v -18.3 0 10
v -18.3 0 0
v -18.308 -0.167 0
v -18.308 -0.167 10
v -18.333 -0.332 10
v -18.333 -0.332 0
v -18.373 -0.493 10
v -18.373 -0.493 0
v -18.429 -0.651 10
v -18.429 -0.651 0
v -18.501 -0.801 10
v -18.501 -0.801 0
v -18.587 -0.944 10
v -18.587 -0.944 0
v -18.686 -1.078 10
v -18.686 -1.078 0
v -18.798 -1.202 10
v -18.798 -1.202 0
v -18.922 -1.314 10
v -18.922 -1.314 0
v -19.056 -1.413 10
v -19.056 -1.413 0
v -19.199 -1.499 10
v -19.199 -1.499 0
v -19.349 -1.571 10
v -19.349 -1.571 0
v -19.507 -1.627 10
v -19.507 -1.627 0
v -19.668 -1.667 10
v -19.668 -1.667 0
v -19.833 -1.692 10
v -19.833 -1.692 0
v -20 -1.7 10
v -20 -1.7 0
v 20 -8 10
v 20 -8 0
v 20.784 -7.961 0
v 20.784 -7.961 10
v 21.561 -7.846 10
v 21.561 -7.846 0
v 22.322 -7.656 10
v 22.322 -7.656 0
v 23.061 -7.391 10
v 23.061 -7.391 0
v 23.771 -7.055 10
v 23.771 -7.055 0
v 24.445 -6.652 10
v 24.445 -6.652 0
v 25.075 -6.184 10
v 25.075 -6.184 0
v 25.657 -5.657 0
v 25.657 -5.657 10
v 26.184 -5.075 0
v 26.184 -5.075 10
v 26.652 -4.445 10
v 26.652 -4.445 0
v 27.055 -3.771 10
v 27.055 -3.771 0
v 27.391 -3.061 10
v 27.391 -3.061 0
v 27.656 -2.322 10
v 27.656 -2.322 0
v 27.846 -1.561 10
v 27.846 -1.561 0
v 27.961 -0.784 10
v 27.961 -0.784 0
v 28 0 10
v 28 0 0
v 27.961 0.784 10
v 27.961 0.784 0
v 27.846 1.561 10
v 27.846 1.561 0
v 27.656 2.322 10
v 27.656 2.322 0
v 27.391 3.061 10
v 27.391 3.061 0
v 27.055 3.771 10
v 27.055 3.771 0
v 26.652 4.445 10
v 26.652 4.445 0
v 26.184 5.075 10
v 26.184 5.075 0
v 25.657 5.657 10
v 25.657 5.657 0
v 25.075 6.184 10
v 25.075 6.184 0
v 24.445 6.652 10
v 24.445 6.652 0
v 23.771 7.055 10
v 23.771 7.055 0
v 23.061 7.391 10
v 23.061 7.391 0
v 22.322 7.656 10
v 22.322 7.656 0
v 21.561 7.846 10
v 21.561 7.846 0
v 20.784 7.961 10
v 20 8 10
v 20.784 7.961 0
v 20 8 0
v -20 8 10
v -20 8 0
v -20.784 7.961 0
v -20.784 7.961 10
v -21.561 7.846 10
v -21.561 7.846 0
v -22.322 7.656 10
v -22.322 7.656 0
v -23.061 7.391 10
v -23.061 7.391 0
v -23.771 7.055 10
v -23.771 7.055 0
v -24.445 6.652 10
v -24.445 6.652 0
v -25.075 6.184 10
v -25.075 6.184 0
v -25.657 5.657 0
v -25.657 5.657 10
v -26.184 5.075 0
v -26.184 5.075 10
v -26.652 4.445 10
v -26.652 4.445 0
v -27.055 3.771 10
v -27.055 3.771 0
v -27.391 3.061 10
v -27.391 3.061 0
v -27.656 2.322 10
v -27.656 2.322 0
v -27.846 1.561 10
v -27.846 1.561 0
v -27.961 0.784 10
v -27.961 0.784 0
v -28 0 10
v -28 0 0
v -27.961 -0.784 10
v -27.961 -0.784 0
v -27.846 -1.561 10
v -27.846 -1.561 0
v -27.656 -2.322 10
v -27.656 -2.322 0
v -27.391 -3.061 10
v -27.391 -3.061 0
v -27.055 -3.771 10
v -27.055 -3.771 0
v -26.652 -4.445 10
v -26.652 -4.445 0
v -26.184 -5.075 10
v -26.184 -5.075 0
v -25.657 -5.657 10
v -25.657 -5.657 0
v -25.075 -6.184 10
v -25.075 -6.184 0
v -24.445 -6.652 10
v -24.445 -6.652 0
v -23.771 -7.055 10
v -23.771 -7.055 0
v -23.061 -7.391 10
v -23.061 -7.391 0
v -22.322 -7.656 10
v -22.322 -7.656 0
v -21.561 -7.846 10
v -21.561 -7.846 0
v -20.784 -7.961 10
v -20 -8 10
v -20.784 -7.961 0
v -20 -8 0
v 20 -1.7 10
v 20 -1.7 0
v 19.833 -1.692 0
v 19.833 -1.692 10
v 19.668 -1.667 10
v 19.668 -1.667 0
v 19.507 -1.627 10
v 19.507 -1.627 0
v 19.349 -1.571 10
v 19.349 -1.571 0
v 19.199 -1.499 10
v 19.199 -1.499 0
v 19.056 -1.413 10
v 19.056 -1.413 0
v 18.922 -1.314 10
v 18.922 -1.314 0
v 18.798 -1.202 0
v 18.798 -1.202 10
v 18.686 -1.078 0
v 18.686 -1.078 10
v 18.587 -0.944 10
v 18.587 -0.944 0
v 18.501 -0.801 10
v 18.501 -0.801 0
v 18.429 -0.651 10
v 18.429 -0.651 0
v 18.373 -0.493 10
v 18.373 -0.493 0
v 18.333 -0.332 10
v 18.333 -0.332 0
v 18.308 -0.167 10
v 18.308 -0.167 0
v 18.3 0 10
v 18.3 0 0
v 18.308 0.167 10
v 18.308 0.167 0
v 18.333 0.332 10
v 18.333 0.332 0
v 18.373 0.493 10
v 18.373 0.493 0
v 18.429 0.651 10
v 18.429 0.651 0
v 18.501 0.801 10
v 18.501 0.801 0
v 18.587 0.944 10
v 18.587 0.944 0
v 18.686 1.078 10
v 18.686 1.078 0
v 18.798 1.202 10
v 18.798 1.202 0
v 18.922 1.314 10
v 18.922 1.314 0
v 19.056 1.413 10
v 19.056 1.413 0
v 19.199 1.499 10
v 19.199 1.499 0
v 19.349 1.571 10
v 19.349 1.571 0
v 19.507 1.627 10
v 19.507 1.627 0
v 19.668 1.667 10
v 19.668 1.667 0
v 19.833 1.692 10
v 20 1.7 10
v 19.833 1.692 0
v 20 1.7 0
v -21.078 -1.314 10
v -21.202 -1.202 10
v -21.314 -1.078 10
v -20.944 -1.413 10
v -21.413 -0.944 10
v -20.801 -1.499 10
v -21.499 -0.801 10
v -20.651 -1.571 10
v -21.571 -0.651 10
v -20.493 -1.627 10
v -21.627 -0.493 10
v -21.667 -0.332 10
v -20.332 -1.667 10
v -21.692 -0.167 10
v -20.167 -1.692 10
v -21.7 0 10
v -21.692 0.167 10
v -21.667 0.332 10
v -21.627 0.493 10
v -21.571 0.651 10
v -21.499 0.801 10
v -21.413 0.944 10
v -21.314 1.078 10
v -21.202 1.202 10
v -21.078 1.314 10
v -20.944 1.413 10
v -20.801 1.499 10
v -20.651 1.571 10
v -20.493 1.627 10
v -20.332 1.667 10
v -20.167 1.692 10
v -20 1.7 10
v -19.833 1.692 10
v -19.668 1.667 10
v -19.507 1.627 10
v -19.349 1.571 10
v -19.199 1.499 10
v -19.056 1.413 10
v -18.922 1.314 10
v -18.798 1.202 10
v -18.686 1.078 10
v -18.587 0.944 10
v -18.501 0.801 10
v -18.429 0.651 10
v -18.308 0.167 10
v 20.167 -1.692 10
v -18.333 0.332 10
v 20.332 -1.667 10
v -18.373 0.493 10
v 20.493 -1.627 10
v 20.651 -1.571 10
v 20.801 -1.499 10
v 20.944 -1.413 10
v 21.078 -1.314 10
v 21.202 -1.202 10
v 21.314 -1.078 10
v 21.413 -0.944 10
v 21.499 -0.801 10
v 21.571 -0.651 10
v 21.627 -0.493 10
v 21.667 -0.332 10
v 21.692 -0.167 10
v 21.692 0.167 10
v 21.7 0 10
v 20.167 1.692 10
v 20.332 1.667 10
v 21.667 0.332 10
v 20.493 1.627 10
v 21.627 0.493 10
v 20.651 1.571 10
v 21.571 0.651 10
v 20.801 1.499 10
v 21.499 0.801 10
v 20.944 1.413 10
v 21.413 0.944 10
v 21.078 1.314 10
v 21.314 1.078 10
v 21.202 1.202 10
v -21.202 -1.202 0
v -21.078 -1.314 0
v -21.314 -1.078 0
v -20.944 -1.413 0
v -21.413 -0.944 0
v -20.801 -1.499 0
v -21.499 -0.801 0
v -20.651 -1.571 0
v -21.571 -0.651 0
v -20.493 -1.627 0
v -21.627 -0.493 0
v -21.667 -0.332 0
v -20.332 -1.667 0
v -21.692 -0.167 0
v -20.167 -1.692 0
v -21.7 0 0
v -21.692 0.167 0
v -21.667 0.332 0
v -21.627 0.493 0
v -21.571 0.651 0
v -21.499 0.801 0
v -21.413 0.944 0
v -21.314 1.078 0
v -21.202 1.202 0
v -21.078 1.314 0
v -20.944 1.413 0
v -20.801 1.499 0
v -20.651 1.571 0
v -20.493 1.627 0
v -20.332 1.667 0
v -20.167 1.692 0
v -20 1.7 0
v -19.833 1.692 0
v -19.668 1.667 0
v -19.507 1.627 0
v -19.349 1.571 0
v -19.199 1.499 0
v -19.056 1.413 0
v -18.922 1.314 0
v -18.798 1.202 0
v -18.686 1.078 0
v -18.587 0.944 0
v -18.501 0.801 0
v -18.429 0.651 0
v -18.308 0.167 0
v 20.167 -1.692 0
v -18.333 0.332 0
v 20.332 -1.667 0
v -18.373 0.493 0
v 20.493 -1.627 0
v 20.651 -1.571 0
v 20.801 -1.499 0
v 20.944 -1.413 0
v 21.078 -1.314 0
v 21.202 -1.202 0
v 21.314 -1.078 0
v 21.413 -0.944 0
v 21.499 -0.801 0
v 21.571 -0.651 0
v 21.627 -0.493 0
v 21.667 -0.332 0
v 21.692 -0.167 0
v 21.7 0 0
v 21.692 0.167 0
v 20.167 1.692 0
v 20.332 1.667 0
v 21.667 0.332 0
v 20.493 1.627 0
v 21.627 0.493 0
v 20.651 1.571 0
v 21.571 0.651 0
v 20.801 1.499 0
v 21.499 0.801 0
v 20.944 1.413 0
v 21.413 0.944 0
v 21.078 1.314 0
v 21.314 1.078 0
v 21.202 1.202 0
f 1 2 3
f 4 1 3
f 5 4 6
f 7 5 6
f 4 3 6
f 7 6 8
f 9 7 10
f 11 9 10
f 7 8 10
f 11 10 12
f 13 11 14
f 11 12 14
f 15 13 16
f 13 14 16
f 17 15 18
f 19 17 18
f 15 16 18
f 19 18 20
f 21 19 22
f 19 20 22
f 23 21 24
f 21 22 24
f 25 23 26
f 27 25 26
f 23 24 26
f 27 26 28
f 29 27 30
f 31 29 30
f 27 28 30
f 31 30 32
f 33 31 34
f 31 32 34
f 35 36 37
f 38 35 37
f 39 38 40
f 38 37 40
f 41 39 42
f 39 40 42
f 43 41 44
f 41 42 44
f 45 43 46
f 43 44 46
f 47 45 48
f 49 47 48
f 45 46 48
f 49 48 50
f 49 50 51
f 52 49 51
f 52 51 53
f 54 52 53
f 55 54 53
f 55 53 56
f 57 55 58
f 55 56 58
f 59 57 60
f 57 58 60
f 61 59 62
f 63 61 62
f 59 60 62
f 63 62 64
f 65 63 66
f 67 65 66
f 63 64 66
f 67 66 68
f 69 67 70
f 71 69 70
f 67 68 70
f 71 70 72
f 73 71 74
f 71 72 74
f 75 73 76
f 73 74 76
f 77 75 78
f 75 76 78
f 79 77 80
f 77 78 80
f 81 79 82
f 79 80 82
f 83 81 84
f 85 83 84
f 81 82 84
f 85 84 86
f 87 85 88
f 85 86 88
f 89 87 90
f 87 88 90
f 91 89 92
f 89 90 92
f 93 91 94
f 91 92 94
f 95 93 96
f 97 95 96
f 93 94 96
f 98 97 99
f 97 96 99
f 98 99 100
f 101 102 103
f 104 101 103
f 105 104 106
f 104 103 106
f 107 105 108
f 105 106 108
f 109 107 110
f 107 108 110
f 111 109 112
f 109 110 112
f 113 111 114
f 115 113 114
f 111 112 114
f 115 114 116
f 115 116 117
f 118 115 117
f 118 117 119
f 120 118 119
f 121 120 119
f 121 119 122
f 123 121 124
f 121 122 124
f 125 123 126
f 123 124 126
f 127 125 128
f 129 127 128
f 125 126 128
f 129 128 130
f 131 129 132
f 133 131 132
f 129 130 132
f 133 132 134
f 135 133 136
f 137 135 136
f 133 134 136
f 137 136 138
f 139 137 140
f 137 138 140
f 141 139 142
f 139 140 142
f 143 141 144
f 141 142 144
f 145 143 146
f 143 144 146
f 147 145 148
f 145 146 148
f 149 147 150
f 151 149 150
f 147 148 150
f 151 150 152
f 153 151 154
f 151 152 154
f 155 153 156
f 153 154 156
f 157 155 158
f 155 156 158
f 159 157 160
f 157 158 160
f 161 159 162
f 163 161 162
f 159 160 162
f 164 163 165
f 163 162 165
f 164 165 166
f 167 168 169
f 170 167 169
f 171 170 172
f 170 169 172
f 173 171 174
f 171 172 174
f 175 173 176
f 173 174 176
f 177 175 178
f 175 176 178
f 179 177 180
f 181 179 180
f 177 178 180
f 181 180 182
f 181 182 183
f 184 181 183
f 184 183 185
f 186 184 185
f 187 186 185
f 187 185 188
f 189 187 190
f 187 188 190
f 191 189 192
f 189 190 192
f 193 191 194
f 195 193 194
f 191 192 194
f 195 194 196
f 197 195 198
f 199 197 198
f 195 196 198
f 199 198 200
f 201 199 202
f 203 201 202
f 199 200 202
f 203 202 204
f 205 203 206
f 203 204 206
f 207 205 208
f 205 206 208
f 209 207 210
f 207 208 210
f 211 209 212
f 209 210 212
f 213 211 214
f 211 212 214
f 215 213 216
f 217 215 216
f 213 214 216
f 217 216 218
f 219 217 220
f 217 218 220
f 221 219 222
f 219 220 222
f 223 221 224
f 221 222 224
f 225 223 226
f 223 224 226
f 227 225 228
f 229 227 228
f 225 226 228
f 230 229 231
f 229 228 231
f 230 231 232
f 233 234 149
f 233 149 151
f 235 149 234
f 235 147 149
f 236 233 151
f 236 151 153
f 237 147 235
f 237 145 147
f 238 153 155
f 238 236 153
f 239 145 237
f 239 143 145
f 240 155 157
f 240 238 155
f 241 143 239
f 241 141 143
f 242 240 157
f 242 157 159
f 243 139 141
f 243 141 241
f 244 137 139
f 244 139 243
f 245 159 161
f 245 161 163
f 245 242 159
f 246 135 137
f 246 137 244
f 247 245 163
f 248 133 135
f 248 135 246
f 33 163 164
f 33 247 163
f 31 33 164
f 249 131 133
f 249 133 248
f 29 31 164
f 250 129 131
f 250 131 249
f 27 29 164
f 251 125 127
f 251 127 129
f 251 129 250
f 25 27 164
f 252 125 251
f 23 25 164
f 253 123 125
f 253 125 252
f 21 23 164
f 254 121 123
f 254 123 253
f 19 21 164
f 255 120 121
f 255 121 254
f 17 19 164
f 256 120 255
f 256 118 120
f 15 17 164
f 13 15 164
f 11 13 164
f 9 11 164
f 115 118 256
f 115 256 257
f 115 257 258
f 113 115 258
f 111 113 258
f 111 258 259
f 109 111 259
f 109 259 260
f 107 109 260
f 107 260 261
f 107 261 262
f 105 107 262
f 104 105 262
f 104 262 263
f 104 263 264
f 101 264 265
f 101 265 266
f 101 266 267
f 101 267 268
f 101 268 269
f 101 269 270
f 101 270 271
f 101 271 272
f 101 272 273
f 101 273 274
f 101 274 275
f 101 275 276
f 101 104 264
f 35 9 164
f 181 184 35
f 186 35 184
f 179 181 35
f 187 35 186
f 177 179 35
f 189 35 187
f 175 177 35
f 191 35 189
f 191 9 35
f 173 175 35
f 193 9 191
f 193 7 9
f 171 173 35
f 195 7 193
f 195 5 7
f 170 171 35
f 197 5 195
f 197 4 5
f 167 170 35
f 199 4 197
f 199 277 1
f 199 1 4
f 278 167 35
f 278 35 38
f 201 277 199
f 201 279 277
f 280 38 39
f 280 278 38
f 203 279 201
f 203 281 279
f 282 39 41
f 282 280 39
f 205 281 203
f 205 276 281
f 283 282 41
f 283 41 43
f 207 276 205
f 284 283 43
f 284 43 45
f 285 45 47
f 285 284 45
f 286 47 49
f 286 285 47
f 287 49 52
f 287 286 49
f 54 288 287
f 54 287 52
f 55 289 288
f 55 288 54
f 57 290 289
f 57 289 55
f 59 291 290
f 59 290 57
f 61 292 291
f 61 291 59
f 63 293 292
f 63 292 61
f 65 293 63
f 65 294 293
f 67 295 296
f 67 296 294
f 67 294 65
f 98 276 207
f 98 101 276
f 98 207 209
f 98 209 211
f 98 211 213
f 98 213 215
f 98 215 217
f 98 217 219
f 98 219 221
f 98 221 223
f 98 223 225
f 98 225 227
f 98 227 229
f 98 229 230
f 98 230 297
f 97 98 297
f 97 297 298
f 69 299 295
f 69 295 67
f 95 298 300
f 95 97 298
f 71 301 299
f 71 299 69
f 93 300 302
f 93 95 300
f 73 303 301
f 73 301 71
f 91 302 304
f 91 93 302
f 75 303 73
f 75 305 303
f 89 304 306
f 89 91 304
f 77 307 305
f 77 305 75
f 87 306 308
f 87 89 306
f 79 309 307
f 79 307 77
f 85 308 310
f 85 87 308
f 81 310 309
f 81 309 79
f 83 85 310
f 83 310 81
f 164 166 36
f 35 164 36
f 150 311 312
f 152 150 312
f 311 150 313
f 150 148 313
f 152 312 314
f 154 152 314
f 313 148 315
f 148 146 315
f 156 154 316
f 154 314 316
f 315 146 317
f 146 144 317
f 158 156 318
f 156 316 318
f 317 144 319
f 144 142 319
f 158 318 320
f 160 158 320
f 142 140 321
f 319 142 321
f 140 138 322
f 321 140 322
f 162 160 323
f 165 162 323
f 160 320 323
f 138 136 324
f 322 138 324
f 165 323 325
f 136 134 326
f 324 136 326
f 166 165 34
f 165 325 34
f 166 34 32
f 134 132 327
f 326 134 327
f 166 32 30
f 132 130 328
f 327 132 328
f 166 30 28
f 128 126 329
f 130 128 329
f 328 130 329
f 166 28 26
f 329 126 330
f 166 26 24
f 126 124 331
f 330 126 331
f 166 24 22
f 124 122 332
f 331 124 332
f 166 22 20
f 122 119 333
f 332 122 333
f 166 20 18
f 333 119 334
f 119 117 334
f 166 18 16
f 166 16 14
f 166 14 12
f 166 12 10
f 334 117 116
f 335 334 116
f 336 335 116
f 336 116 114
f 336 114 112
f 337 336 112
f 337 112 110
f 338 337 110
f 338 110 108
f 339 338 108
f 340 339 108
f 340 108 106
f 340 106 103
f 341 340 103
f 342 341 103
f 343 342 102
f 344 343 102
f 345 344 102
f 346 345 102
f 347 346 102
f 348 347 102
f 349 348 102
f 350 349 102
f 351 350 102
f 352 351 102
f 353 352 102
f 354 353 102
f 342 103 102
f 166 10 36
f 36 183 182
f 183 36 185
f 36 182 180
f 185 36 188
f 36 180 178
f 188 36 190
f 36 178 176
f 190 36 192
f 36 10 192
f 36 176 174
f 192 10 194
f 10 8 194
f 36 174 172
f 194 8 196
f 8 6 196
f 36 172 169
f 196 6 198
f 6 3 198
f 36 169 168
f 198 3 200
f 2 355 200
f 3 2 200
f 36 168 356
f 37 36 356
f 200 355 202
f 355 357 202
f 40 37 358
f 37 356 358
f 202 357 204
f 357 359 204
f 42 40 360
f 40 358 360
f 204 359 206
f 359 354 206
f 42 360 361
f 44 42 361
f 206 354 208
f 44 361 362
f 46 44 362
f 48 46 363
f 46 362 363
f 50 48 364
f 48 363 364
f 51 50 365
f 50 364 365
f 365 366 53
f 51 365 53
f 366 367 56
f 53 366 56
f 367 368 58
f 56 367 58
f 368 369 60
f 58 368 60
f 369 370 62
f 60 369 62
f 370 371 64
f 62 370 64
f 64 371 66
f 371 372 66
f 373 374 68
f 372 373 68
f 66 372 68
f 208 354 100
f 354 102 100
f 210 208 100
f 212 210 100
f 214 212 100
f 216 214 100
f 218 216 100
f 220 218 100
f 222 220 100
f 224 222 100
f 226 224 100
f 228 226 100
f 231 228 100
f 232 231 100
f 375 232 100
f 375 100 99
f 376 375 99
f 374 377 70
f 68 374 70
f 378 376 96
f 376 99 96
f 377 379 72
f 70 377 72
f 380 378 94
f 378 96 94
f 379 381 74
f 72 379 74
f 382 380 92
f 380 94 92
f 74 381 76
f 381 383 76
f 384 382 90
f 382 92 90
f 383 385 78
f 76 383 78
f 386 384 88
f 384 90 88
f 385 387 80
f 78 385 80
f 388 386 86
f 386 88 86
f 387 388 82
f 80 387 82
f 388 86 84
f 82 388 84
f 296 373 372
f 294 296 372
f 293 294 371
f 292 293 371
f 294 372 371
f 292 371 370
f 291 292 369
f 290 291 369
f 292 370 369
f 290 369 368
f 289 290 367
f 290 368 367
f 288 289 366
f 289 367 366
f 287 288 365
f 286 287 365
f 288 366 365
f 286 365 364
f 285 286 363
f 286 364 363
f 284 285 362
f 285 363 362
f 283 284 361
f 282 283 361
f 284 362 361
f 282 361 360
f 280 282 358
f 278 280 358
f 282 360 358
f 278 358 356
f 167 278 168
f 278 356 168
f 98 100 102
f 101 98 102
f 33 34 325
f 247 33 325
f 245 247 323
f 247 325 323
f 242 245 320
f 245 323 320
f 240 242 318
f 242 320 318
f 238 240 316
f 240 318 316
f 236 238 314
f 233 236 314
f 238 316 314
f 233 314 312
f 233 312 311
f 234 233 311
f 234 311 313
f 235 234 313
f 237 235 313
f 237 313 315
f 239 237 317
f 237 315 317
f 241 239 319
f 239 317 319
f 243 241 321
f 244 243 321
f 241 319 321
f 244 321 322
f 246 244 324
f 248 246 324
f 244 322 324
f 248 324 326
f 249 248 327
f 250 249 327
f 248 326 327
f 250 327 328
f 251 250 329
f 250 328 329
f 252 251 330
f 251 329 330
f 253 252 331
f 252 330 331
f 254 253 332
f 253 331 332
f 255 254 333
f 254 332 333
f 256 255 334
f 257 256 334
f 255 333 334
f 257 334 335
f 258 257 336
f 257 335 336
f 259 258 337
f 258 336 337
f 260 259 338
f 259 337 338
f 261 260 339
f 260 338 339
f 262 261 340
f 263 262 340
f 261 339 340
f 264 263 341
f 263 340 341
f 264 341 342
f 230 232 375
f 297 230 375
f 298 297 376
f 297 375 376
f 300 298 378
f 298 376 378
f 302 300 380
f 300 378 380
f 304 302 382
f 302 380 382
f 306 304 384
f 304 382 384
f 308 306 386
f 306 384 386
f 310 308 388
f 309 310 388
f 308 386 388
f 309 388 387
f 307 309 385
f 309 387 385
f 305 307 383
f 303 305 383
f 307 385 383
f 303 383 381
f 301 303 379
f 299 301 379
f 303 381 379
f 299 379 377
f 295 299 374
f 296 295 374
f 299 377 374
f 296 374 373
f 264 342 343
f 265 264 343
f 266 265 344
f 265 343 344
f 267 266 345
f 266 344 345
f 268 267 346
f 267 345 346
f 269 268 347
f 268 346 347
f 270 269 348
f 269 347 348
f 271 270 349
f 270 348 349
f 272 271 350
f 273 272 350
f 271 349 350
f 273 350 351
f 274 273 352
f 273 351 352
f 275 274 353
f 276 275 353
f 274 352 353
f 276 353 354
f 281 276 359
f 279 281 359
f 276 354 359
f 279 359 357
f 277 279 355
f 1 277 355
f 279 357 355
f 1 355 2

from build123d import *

# Parameters (mm, degrees)
F1_DEPTH = 10


with BuildPart() as f1:
    # F0 (on Top) → F1 (new body)
    with BuildSketch(Plane.XY):
        with BuildLine():
            Line((20, 8), (-20, 8))
            Line((-20, 8), (-20, 1.7))
            ThreePointArc((-20, 1.7), (-18.797918, 1.202082), (-18.3, 0))
            ThreePointArc((-18.3, 0), (-18.797918, -1.202082), (-20, -1.7))
            Line((-20, -1.7), (-20, -8))
            Line((-20, -8), (20, -8))
            Line((20, -8), (20, -1.7))
            ThreePointArc((20, -1.7), (18.3, 0), (20, 1.7))
            Line((20, 1.7), (20, 8))
        make_face()
        with BuildLine():
            Line((-20, 1.7), (-20, 8))
            ThreePointArc((-20, 8), (-28, 0), (-20, -8))
            Line((-20, -8), (-20, -1.7))
            ThreePointArc((-20, -1.7), (-21.7, 0), (-20, 1.7))
        make_face()
        with BuildLine():
            ThreePointArc((20, -8), (28, 0), (20, 8))
            Line((20, 8), (20, 1.7))
            ThreePointArc((20, 1.7), (21.202082, 1.202082), (21.7, 0))
            ThreePointArc((21.7, 0), (21.202082, -1.202082), (20, -1.7))
            Line((20, -1.7), (20, -8))
        make_face()
    extrude(amount=F1_DEPTH)


solid = f1.part
